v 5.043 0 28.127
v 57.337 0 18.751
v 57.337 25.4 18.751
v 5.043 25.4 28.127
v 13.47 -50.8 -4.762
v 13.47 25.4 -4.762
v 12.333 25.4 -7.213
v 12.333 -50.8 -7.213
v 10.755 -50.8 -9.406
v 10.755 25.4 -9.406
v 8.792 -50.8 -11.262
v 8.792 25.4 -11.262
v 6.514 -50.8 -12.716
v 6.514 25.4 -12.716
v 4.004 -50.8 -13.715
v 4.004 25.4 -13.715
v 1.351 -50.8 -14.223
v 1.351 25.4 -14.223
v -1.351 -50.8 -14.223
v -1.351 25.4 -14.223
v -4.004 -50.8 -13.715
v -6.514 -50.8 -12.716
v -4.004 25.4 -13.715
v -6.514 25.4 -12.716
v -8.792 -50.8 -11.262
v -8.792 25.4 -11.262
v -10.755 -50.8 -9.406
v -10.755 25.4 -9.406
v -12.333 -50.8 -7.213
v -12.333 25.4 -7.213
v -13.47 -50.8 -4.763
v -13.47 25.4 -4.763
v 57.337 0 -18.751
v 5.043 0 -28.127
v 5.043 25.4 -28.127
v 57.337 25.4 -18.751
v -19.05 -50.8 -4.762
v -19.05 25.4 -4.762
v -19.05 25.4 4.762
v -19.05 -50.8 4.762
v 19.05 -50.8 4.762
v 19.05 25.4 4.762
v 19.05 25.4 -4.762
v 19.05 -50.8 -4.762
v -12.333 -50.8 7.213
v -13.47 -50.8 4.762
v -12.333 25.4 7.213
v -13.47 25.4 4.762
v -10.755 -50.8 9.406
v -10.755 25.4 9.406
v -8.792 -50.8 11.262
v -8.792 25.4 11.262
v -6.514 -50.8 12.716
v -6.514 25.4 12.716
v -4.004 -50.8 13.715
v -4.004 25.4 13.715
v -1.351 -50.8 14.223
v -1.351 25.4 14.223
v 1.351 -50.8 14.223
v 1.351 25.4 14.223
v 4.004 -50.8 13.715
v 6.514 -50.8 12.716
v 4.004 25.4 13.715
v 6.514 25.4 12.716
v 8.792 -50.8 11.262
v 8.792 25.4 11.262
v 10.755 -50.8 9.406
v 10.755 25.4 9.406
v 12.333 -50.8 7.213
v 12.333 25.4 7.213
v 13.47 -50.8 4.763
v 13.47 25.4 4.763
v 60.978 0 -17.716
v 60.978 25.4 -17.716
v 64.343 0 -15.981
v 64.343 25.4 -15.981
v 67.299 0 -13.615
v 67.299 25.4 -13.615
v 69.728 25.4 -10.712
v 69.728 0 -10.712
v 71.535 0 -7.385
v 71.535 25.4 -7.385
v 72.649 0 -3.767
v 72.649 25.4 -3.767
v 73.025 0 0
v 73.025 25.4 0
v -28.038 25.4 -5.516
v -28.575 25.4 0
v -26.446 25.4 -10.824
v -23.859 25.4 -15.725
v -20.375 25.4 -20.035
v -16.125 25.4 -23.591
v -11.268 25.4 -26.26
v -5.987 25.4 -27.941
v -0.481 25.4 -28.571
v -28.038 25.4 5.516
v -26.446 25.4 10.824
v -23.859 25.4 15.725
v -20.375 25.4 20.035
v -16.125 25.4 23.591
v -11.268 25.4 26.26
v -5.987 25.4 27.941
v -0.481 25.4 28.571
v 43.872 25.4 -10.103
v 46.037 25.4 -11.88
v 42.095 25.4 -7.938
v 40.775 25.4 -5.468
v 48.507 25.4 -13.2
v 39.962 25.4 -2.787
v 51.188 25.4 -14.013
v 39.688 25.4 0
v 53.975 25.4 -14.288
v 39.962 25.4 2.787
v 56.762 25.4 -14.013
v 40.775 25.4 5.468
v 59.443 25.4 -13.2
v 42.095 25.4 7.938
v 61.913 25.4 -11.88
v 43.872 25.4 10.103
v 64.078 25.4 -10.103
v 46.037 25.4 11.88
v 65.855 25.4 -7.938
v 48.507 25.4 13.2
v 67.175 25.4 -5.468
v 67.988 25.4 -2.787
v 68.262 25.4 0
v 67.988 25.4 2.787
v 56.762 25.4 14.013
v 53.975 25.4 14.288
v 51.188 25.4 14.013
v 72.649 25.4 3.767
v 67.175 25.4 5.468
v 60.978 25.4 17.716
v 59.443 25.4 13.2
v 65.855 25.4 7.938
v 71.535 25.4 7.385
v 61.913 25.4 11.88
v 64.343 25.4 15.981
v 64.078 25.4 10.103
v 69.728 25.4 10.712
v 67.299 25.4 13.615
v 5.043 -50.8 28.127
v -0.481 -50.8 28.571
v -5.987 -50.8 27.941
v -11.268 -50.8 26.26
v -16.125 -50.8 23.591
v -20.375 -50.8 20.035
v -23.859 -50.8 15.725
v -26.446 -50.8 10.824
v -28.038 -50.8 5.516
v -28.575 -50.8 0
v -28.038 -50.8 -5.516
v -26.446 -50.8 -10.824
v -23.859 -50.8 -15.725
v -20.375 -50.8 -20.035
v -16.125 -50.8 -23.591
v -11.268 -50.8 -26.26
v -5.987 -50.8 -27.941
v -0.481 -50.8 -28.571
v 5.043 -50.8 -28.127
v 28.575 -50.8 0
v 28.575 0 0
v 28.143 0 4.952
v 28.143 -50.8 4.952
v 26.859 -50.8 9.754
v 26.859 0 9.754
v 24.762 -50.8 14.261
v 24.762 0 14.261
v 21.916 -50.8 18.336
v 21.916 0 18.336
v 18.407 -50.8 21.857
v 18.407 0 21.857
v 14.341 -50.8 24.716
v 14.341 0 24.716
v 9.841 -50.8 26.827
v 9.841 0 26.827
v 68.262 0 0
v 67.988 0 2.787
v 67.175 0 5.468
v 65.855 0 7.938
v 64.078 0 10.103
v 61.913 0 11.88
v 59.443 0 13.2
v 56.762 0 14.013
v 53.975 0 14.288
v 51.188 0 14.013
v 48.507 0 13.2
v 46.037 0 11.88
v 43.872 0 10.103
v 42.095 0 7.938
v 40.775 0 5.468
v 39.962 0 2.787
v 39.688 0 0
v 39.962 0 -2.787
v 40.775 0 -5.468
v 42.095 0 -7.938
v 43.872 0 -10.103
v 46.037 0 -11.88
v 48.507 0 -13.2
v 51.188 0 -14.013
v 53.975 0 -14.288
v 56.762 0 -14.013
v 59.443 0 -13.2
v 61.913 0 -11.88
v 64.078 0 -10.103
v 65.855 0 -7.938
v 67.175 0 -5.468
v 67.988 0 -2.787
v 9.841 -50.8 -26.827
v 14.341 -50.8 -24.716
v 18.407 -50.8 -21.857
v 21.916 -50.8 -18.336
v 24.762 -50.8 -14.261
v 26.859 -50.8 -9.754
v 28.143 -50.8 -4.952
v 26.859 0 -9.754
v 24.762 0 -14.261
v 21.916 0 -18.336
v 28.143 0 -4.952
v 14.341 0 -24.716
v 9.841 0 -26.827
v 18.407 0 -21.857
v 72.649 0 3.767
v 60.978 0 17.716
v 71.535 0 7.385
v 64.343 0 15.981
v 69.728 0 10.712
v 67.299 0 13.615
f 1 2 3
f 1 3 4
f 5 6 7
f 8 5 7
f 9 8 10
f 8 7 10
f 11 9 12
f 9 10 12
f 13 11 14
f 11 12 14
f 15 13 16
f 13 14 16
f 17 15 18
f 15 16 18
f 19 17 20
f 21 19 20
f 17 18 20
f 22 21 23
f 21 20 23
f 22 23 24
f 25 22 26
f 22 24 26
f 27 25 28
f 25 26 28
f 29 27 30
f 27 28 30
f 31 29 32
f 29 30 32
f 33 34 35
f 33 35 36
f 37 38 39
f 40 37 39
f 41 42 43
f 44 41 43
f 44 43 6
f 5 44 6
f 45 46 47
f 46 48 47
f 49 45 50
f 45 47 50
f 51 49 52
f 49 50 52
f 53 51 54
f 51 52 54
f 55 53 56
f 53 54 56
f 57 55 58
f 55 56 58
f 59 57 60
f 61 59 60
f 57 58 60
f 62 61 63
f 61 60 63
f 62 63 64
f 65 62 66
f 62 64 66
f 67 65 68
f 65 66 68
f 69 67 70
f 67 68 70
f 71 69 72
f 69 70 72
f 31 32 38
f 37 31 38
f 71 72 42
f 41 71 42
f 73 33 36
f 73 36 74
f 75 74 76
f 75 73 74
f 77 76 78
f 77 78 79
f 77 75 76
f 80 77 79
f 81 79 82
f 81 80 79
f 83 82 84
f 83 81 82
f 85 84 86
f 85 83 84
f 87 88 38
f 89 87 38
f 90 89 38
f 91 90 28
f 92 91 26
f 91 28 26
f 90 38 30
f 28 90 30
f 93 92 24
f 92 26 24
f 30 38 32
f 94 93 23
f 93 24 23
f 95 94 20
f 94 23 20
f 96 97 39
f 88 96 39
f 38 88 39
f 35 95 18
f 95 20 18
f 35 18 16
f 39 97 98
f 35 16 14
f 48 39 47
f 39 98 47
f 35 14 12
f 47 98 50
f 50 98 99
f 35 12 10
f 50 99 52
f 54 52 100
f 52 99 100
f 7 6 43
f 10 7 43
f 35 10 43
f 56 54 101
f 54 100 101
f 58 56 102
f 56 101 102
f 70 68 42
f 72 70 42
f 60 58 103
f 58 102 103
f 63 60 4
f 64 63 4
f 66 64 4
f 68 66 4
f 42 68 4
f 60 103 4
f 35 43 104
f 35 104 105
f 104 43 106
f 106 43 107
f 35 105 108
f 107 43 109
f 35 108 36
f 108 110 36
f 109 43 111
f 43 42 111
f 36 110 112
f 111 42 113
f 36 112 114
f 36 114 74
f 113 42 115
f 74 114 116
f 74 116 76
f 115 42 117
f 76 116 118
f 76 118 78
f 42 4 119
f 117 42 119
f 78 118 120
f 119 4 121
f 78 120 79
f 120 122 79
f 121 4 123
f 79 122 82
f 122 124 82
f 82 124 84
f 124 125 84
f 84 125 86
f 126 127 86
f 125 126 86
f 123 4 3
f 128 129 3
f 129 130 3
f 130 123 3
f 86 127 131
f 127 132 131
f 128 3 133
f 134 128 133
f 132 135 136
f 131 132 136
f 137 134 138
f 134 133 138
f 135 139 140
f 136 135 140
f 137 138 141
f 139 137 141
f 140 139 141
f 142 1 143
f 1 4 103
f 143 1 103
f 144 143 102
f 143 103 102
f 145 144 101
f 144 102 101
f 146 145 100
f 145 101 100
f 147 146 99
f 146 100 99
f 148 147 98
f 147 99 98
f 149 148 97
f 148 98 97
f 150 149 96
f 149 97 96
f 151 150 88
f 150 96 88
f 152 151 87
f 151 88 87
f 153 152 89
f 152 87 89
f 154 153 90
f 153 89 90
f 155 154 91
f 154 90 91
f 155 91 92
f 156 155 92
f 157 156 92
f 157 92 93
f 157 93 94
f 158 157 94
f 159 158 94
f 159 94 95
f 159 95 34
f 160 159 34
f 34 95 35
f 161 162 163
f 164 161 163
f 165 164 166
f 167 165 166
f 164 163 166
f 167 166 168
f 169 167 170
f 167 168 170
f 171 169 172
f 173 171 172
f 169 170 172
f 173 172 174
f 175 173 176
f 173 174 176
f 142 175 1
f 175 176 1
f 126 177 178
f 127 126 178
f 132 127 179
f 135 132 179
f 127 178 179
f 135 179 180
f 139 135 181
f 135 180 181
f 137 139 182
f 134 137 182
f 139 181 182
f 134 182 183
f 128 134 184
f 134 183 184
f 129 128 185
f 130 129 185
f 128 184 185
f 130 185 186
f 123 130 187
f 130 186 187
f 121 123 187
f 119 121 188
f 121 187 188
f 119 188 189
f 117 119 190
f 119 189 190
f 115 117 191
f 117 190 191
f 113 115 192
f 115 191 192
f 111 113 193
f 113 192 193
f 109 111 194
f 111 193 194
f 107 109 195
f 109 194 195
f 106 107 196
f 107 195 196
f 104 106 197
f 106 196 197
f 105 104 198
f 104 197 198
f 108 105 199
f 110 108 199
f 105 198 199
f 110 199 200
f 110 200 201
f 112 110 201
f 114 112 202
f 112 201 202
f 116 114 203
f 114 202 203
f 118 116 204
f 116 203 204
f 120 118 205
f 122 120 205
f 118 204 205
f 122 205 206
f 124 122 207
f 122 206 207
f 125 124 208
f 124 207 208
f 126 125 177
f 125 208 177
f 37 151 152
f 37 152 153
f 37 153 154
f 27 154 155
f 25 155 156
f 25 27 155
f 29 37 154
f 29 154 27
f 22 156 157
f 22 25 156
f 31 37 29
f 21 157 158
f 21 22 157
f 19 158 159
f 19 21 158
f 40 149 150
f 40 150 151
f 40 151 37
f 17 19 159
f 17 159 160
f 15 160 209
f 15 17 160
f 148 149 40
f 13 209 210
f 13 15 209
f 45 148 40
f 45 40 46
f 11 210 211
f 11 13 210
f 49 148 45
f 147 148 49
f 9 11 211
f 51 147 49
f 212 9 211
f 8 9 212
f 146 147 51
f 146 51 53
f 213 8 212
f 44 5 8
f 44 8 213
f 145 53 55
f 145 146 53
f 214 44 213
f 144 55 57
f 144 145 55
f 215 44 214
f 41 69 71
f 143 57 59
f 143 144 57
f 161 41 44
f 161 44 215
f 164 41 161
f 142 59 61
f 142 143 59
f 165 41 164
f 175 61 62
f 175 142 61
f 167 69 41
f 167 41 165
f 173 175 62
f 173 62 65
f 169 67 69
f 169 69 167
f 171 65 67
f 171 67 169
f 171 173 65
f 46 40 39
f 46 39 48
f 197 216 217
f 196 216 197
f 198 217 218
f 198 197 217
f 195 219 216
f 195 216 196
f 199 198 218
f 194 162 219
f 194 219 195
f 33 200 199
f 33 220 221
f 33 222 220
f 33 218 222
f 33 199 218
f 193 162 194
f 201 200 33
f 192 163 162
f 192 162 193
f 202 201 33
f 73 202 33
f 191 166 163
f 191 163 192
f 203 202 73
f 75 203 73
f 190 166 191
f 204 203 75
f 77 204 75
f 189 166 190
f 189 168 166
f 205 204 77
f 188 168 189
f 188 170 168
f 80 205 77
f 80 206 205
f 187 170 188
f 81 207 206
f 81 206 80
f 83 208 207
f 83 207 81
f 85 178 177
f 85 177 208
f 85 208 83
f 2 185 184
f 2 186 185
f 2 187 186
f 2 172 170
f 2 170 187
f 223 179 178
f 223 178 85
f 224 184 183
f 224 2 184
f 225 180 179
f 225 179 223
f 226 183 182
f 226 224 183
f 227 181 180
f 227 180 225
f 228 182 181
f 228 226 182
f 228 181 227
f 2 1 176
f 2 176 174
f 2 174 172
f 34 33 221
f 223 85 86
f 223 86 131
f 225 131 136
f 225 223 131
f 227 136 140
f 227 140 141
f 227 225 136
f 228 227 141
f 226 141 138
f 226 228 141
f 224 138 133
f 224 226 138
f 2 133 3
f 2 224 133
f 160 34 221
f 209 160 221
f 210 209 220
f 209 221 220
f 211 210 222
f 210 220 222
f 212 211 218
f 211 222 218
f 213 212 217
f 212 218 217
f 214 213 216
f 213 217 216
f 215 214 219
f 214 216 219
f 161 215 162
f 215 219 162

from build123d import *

# Parameters (mm, degrees)
F0_R     = 14.2875
F1_DEPTH = 25.4
F2_DEPTH = 50.8


with BuildPart() as f1:
    # F0 (on Front) → F1 (new body)
    with BuildSketch(Plane.XZ):
        with BuildLine():
            ThreePointArc((5.042647, -28.126541), (21.916025, -18.336262), (28.575, 0))
            ThreePointArc((28.575, 0), (21.916025, 18.336262), (5.042647, 28.126541))
            ThreePointArc((5.042647, 28.126541), (-28.575, 0), (5.042647, -28.126541))
        make_face()
        with BuildLine():
            ThreePointArc((-13.470384, 4.7625), (0, 14.2875), (13.470384, 4.7625))
            Line((13.470384, 4.7625), (19.05, 4.7625))
            Line((19.05, 4.7625), (19.05, -4.7625))
            Line((19.05, -4.7625), (13.470384, -4.7625))
            ThreePointArc((13.470384, -4.7625), (0, -14.2875), (-13.470384, -4.7625))
            Line((-13.470384, -4.7625), (-19.05, -4.7625))
            Line((-19.05, -4.7625), (-19.05, 4.7625))
            Line((-19.05, 4.7625), (-13.470384, 4.7625))
        make_face(mode=Mode.SUBTRACT)
        with BuildLine():
            ThreePointArc((5.042647, 28.126541), (21.916025, 18.336262), (28.575, 0))
            ThreePointArc((28.575, 0), (21.916025, -18.336262), (5.042647, -28.126541))
            Line((5.042647, -28.126541), (57.336765, -18.751028))
            ThreePointArc((57.336765, -18.751028), (34.925, 0), (57.336765, 18.751028))
            Line((57.336765, 18.751028), (5.042647, 28.126541))
        make_face()
        with BuildLine():
            ThreePointArc((73.025, 0), (68.585683, 12.224174), (57.336765, 18.751028))
            ThreePointArc((57.336765, 18.751028), (34.925, 0), (57.336765, -18.751028))
            ThreePointArc((57.336765, -18.751028), (68.585683, -12.224174), (73.025, 0))
        make_face()
        with Locations((53.975, 0)):
            Circle(F0_R, mode=Mode.SUBTRACT)
    extrude(amount=-F1_DEPTH)

    # F0 (on Front) → F2 (join)
    with BuildSketch(Plane.XZ):
        with BuildLine():
            ThreePointArc((5.042647, -28.126541), (21.916025, -18.336262), (28.575, 0))
            ThreePointArc((28.575, 0), (21.916025, 18.336262), (5.042647, 28.126541))
            ThreePointArc((5.042647, 28.126541), (-28.575, 0), (5.042647, -28.126541))
        make_face()
        with BuildLine():
            ThreePointArc((-13.470384, 4.7625), (0, 14.2875), (13.470384, 4.7625))
            Line((13.470384, 4.7625), (19.05, 4.7625))
            Line((19.05, 4.7625), (19.05, -4.7625))
            Line((19.05, -4.7625), (13.470384, -4.7625))
            ThreePointArc((13.470384, -4.7625), (0, -14.2875), (-13.470384, -4.7625))
            Line((-13.470384, -4.7625), (-19.05, -4.7625))
            Line((-19.05, -4.7625), (-19.05, 4.7625))
            Line((-19.05, 4.7625), (-13.470384, 4.7625))
        make_face(mode=Mode.SUBTRACT)
    extrude(amount=F2_DEPTH)


solid = f1.part
